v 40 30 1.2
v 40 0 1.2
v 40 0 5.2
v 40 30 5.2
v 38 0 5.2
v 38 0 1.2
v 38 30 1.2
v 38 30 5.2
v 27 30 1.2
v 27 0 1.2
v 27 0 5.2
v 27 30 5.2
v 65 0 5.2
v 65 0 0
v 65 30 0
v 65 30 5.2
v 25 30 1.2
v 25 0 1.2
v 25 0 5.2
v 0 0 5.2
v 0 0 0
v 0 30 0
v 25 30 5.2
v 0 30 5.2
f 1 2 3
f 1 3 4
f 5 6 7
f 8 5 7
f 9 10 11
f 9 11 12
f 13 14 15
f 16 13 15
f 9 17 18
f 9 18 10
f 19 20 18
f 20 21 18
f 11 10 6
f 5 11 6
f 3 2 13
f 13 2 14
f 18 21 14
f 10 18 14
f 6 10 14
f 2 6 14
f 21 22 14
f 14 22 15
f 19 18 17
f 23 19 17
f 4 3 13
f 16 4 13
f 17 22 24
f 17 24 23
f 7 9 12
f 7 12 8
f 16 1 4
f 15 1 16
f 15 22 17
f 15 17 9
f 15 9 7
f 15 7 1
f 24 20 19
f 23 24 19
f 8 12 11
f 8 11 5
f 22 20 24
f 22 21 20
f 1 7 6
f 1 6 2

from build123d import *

# Parameters (mm, degrees)
F0_W     = 65
F0_H     = 30
F1_DEPTH = 1.2
F2_W     = 25
F2_H     = 30
F2_W_2   = 11
F3_DEPTH = 4


with BuildPart() as f1:
    # F0 (on Top) → F1 (new body)
    with BuildSketch(Plane.XY):
        with Locations((32.5, 15)):
            Rectangle(F0_W, F0_H)
    extrude(amount=F1_DEPTH)

    # F2 (on face) → F3 (join)
    with BuildSketch(Plane.XY.offset(1.2)):
        with Locations((12.5, 15)):
            Rectangle(F2_W, F2_H)
        with Locations((52.5, 15)):
            Rectangle(F2_W, F2_H)
        with Locations((32.5, 15)):
            Rectangle(F2_W_2, F2_H)
    extrude(amount=F3_DEPTH)


solid = f1.part
